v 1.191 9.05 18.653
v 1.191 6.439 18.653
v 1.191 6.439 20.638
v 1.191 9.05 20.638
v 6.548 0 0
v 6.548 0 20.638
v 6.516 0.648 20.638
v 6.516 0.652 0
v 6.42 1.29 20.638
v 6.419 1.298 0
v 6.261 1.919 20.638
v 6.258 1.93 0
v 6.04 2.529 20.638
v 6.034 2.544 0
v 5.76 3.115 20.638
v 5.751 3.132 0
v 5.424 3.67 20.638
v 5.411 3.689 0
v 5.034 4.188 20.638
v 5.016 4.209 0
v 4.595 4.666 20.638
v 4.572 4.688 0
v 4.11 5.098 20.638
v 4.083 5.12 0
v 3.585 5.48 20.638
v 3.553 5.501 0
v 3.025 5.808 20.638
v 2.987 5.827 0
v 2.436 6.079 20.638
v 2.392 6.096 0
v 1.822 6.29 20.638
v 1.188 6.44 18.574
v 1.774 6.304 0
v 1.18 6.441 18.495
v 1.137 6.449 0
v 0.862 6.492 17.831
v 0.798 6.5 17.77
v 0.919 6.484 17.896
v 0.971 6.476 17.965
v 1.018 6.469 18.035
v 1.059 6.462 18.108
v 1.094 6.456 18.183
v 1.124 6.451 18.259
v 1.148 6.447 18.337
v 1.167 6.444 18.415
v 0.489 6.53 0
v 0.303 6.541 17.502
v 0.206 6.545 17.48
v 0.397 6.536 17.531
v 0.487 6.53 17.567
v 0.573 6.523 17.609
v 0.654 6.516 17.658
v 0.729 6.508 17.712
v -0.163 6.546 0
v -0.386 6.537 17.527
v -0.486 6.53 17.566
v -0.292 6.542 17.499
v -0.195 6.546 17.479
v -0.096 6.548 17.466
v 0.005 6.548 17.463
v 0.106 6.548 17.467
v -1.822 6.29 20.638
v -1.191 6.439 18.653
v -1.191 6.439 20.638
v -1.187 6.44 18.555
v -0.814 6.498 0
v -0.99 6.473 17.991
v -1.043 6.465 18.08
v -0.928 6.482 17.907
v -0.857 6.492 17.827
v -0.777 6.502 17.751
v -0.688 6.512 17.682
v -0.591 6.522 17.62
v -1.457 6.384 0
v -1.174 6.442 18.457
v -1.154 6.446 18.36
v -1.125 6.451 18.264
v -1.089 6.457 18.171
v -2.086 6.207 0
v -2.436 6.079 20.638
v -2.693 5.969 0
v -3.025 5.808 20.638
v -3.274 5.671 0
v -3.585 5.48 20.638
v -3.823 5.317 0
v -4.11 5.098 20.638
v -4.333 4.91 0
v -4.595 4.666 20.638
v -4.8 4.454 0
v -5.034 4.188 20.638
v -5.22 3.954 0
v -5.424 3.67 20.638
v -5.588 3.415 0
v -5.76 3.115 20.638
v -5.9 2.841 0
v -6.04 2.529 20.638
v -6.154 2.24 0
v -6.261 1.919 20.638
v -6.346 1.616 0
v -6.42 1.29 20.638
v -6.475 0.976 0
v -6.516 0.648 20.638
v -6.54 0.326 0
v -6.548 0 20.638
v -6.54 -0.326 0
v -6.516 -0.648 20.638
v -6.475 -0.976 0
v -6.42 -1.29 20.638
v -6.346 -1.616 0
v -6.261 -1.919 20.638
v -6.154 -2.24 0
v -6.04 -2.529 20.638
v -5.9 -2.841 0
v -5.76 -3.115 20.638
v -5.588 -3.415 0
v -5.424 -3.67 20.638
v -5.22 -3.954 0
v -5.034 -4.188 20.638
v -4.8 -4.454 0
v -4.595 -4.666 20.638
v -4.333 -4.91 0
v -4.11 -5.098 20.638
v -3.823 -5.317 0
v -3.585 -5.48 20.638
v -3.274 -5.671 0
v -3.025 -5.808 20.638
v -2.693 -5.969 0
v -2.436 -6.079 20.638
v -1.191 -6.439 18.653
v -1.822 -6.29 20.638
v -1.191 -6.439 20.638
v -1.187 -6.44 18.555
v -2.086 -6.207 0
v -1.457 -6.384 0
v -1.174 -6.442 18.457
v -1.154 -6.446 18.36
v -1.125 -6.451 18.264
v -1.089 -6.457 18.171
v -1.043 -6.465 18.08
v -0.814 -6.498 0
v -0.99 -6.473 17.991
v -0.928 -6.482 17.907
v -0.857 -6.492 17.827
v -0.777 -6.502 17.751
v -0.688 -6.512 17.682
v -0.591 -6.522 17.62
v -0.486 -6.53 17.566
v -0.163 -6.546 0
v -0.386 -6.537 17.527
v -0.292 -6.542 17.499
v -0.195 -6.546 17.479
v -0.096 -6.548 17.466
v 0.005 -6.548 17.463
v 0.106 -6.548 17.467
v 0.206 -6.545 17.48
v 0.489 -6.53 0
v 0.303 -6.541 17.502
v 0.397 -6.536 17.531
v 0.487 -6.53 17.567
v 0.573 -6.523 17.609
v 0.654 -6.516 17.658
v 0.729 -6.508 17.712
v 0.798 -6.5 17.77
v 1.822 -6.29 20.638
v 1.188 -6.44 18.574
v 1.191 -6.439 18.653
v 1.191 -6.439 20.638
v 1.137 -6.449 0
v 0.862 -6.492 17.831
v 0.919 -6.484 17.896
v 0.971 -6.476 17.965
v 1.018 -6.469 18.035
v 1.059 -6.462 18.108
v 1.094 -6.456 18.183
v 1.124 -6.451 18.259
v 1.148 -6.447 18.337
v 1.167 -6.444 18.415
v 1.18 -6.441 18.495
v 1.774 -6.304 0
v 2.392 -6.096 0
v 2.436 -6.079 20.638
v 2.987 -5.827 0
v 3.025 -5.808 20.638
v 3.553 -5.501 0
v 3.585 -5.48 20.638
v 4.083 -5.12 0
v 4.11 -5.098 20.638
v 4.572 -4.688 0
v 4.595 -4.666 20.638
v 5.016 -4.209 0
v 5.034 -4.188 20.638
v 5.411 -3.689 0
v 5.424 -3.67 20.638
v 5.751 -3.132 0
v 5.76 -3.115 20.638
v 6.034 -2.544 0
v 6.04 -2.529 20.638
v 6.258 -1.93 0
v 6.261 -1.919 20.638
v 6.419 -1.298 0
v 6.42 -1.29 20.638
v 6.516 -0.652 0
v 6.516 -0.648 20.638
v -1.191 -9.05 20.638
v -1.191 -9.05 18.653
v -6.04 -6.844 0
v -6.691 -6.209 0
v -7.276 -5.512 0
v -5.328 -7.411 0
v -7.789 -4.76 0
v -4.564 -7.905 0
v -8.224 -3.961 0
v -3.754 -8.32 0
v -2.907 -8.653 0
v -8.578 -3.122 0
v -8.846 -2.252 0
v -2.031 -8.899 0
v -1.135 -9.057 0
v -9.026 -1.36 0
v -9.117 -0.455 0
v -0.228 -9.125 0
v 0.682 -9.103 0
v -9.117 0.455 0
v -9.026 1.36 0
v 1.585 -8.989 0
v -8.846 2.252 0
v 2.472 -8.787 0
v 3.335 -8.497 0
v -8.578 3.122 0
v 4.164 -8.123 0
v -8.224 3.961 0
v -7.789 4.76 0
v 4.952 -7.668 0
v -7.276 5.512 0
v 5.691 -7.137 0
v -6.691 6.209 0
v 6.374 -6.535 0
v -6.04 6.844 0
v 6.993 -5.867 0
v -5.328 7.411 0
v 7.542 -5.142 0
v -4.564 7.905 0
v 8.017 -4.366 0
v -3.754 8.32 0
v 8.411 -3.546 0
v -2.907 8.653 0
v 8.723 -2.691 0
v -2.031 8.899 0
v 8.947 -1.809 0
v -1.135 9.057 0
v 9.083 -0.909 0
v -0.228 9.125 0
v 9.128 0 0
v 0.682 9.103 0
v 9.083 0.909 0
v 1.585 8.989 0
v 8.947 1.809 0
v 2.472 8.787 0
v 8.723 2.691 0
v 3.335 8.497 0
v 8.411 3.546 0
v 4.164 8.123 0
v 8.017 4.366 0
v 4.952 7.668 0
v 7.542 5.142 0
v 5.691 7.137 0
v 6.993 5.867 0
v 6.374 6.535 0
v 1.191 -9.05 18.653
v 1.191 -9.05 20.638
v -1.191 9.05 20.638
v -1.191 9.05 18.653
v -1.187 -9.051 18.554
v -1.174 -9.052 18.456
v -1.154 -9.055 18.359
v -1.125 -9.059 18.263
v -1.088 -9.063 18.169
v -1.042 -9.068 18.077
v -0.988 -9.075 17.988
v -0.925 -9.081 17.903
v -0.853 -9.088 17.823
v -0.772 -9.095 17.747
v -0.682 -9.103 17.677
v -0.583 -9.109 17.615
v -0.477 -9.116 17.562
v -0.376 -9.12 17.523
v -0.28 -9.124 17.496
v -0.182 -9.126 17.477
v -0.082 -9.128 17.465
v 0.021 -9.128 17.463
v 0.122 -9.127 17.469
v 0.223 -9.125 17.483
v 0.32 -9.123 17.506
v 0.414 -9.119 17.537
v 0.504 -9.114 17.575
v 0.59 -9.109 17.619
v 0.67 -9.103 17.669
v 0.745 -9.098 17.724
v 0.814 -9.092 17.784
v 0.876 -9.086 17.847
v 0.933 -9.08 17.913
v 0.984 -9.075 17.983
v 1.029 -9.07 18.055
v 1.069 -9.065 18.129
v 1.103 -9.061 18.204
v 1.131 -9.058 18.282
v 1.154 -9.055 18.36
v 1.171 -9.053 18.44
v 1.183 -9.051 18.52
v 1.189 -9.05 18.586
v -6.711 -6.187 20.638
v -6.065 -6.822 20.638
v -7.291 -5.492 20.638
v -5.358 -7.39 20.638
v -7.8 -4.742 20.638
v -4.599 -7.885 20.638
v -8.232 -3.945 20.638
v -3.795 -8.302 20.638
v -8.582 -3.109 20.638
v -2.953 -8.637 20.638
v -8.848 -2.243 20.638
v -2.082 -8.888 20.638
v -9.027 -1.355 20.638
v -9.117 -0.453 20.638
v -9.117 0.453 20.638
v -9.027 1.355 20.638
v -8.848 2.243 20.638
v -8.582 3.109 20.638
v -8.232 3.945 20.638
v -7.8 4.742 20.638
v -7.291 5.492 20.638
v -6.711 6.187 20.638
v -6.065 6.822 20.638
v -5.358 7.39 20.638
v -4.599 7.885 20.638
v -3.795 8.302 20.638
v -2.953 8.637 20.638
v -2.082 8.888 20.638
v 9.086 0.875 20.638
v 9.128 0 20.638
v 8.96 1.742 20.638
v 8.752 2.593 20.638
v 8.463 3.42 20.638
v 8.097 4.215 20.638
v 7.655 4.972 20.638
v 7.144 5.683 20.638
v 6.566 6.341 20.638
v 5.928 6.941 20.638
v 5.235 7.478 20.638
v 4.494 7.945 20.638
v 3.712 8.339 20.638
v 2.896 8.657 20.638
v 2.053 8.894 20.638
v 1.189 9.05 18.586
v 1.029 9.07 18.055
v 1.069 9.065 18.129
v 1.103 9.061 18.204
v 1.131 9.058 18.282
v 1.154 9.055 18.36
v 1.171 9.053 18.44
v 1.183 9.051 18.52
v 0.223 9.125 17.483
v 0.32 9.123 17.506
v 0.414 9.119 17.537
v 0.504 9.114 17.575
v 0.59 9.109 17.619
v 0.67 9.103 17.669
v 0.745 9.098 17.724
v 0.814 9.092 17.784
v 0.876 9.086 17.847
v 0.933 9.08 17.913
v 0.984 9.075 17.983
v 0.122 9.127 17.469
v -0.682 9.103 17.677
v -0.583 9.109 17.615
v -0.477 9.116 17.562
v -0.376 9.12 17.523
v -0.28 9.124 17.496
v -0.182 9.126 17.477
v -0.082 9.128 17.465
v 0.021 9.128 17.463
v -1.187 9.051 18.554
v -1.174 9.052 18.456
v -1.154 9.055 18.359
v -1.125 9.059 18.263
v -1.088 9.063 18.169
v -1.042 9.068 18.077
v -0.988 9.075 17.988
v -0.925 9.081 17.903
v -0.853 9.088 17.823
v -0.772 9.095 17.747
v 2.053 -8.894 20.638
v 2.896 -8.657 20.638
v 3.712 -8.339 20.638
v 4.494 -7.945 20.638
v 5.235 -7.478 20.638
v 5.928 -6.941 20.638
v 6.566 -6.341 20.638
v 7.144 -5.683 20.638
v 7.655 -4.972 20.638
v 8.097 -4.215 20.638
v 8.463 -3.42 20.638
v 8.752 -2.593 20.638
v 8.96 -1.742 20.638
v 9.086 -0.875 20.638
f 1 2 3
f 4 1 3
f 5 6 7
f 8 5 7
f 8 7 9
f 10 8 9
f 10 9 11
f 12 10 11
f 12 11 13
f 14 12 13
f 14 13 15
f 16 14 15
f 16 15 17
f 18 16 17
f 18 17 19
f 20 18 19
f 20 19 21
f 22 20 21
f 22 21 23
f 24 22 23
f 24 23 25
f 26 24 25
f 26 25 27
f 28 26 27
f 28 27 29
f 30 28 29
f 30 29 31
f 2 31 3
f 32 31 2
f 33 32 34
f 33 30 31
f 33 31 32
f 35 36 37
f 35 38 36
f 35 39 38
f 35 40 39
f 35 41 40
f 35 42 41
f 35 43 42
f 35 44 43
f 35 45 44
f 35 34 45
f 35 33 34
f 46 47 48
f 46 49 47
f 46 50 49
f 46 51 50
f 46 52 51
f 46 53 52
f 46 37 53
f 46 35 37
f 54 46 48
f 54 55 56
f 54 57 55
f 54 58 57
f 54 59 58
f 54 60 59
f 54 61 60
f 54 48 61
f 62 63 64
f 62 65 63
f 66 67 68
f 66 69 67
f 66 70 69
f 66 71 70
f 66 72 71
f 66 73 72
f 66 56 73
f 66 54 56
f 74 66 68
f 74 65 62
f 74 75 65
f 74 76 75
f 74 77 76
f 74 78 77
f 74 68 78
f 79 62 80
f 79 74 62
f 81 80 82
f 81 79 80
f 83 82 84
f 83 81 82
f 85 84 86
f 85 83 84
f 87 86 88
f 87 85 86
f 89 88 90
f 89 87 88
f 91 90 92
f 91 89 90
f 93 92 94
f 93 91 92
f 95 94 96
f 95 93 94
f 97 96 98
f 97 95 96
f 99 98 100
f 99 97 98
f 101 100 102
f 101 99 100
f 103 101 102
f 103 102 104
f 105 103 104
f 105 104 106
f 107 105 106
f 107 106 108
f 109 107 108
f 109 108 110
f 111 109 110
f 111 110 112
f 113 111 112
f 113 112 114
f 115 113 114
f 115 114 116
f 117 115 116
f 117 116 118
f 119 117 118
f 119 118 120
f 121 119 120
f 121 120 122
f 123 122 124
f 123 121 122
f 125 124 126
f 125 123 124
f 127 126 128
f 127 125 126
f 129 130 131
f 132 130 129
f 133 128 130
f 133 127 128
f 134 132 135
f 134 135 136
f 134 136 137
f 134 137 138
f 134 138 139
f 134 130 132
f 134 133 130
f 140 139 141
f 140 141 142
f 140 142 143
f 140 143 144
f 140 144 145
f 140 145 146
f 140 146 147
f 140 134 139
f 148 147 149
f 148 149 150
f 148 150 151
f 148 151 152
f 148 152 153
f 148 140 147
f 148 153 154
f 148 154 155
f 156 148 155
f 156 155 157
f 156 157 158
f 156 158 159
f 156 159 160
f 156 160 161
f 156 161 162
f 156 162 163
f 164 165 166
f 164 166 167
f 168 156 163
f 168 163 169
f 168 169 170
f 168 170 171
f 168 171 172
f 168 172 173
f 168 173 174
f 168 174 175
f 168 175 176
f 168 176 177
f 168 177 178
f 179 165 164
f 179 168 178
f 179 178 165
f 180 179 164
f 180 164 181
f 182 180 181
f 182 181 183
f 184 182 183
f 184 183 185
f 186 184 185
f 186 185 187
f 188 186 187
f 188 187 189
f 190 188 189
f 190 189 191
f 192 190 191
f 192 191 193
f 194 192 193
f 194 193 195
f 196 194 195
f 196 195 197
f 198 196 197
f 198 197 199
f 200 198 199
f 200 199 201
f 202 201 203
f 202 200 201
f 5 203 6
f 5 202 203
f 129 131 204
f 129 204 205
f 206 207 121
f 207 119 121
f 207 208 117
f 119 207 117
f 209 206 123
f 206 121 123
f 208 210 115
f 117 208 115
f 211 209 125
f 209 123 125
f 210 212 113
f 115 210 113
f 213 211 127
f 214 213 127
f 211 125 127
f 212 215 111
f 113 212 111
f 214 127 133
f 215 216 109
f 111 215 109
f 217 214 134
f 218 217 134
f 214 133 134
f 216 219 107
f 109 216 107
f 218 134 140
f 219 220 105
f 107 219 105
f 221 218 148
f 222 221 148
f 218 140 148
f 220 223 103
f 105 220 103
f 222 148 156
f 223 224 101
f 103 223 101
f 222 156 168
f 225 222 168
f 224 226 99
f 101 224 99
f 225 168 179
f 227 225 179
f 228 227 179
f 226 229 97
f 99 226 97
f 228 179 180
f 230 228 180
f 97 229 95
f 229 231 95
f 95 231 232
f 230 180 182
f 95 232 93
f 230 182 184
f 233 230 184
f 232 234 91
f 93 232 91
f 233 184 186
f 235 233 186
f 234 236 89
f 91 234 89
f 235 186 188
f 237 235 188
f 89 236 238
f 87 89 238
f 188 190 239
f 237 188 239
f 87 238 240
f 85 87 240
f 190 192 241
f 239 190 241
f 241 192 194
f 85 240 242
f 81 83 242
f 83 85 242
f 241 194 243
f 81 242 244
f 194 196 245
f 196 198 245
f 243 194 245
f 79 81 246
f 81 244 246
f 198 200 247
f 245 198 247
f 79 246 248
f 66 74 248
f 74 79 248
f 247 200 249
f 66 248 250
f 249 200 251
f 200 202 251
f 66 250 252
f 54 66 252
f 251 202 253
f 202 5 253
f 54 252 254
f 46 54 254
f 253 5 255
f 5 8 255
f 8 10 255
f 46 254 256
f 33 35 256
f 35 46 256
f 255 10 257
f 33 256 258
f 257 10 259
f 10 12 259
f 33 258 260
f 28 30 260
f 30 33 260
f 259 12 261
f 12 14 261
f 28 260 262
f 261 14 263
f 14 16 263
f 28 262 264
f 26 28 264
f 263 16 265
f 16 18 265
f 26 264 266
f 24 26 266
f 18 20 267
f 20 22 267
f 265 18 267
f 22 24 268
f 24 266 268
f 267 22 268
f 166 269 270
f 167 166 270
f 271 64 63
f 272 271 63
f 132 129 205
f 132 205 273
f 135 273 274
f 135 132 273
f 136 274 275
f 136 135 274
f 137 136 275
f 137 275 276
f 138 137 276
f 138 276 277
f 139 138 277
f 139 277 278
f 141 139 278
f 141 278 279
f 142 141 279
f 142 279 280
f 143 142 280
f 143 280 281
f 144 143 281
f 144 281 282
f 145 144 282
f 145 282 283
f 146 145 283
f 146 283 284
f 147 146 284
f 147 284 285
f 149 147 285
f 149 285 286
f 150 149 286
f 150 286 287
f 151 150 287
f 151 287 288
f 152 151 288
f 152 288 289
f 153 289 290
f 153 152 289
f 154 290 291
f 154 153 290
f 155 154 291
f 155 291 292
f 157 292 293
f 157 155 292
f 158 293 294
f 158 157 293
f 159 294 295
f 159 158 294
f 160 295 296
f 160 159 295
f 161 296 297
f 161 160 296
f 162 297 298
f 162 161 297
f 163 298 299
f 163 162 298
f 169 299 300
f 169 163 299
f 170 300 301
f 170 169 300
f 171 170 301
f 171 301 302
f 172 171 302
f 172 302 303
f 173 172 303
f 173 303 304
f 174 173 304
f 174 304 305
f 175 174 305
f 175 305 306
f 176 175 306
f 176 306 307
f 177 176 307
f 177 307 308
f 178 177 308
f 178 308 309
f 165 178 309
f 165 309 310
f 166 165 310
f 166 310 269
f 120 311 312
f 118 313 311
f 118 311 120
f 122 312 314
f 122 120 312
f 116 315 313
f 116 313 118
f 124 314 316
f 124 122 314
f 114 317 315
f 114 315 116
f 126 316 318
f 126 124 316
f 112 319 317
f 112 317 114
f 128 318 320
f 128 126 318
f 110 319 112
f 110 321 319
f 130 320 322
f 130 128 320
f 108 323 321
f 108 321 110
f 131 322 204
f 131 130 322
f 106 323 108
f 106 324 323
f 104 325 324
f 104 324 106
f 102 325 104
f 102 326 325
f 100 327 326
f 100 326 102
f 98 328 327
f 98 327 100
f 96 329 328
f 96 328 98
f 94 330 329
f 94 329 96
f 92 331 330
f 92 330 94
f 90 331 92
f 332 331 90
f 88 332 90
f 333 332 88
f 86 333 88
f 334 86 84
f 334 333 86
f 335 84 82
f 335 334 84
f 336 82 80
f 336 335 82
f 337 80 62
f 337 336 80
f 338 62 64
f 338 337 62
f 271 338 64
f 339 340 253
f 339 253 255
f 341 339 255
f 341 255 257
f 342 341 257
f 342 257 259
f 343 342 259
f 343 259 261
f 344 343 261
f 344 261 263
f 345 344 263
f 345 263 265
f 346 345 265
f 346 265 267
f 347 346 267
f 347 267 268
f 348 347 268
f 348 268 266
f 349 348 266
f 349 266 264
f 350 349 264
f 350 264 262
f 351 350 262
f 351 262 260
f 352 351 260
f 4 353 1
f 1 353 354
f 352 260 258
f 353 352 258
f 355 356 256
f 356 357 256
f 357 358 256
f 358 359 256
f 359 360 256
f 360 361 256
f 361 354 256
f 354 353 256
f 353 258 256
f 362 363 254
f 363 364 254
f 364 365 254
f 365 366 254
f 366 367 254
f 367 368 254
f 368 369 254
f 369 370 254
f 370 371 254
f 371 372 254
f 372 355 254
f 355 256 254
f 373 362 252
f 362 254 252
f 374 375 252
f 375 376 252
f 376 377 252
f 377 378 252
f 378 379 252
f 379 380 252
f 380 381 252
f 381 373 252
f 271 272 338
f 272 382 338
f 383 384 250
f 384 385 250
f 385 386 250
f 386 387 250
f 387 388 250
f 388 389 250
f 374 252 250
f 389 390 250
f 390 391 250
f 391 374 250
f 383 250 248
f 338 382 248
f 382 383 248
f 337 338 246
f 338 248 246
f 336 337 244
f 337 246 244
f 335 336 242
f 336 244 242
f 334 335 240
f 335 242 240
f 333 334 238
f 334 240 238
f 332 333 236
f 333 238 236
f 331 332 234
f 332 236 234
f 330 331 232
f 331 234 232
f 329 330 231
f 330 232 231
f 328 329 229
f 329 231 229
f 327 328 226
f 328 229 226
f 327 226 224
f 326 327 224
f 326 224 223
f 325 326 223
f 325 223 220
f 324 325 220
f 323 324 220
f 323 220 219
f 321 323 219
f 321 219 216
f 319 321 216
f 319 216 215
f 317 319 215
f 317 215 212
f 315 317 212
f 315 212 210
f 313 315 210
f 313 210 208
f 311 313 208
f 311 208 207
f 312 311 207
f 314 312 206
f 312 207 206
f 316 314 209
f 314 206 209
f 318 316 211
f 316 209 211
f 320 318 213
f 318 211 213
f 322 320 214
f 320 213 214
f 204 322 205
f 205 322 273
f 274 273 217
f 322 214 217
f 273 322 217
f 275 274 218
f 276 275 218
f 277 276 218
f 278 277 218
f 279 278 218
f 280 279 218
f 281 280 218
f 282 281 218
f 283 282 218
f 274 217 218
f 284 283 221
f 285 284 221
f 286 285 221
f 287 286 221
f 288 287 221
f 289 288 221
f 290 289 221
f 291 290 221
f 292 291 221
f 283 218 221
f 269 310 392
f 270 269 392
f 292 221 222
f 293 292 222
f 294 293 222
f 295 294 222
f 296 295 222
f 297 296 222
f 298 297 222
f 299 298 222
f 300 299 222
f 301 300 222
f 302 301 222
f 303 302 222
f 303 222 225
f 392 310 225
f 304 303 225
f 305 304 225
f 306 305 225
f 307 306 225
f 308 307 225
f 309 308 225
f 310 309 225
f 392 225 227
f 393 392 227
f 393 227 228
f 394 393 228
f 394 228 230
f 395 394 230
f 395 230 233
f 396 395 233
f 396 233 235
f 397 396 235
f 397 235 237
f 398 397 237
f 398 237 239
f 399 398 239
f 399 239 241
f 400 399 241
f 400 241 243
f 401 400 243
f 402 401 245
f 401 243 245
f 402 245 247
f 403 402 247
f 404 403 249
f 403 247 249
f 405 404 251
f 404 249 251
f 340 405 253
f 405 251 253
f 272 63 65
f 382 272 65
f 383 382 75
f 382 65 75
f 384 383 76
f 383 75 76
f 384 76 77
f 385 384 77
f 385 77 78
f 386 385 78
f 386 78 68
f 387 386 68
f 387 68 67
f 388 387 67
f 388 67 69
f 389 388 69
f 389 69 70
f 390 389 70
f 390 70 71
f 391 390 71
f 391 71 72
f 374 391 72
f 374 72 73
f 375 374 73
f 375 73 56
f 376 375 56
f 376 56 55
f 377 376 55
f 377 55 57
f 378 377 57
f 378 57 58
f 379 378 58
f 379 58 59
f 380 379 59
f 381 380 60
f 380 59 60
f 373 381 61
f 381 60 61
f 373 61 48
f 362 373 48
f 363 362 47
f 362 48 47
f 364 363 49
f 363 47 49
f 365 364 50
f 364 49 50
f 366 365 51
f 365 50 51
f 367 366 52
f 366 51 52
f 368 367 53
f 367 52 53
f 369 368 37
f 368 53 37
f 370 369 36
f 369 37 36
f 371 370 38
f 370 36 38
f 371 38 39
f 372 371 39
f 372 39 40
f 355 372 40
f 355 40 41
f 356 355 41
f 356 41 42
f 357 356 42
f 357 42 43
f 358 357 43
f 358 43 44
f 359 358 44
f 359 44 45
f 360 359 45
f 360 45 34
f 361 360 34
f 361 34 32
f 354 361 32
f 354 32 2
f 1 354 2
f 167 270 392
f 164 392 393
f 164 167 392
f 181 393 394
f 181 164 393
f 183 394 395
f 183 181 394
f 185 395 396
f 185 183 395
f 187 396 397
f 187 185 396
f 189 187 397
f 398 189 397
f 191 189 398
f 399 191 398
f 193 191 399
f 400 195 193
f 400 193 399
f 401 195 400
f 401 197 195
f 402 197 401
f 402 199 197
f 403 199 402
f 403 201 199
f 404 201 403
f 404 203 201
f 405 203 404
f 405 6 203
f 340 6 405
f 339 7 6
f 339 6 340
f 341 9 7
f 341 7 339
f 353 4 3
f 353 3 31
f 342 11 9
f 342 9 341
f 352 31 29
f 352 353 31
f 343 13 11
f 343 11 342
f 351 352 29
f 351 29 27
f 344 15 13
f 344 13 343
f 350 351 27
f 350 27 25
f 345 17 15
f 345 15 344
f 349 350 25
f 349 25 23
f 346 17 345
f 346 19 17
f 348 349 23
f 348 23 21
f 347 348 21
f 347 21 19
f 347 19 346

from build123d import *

# Parameters (mm, degrees)
SKETCH1_R               = 9.128125
SKETCH1_R_2             = 6.5484375
EXTRUDE1_DEPTH          = 20.6375
CUT_EXTRUDE1_DEPTH      = 10.128125
CUT_EXTRUDE1_DEPTH_BACK = 10.128125


with BuildPart() as part:
    # Sketch1 → Extrude1 (new body)
    with BuildSketch(Plane.XY):
        Circle(SKETCH1_R)
        Circle(SKETCH1_R_2, mode=Mode.SUBTRACT)
    extrude(amount=EXTRUDE1_DEPTH)

    # Sketch2 → Cut-Extrude1 (cut, two sides)
    with BuildSketch(Plane(origin=(0, 0, 0), x_dir=(1, 0, 0), z_dir=(0, 1, 0))) as cut_extrude1_sk:
        with BuildLine():
            Line((-1.190625, -20.6375), (-1.190625, -18.653125))
            ThreePointArc((-1.190625, -18.653125), (0, -17.4625), (1.190625, -18.653125))
            Line((1.190625, -18.653125), (1.190625, -20.6375))
            Line((1.190625, -20.6375), (-1.190625, -20.6375))
        make_face()
    extrude(amount=CUT_EXTRUDE1_DEPTH, mode=Mode.SUBTRACT)
    extrude(cut_extrude1_sk.sketch, amount=-CUT_EXTRUDE1_DEPTH_BACK, mode=Mode.SUBTRACT)


solid = part.part
